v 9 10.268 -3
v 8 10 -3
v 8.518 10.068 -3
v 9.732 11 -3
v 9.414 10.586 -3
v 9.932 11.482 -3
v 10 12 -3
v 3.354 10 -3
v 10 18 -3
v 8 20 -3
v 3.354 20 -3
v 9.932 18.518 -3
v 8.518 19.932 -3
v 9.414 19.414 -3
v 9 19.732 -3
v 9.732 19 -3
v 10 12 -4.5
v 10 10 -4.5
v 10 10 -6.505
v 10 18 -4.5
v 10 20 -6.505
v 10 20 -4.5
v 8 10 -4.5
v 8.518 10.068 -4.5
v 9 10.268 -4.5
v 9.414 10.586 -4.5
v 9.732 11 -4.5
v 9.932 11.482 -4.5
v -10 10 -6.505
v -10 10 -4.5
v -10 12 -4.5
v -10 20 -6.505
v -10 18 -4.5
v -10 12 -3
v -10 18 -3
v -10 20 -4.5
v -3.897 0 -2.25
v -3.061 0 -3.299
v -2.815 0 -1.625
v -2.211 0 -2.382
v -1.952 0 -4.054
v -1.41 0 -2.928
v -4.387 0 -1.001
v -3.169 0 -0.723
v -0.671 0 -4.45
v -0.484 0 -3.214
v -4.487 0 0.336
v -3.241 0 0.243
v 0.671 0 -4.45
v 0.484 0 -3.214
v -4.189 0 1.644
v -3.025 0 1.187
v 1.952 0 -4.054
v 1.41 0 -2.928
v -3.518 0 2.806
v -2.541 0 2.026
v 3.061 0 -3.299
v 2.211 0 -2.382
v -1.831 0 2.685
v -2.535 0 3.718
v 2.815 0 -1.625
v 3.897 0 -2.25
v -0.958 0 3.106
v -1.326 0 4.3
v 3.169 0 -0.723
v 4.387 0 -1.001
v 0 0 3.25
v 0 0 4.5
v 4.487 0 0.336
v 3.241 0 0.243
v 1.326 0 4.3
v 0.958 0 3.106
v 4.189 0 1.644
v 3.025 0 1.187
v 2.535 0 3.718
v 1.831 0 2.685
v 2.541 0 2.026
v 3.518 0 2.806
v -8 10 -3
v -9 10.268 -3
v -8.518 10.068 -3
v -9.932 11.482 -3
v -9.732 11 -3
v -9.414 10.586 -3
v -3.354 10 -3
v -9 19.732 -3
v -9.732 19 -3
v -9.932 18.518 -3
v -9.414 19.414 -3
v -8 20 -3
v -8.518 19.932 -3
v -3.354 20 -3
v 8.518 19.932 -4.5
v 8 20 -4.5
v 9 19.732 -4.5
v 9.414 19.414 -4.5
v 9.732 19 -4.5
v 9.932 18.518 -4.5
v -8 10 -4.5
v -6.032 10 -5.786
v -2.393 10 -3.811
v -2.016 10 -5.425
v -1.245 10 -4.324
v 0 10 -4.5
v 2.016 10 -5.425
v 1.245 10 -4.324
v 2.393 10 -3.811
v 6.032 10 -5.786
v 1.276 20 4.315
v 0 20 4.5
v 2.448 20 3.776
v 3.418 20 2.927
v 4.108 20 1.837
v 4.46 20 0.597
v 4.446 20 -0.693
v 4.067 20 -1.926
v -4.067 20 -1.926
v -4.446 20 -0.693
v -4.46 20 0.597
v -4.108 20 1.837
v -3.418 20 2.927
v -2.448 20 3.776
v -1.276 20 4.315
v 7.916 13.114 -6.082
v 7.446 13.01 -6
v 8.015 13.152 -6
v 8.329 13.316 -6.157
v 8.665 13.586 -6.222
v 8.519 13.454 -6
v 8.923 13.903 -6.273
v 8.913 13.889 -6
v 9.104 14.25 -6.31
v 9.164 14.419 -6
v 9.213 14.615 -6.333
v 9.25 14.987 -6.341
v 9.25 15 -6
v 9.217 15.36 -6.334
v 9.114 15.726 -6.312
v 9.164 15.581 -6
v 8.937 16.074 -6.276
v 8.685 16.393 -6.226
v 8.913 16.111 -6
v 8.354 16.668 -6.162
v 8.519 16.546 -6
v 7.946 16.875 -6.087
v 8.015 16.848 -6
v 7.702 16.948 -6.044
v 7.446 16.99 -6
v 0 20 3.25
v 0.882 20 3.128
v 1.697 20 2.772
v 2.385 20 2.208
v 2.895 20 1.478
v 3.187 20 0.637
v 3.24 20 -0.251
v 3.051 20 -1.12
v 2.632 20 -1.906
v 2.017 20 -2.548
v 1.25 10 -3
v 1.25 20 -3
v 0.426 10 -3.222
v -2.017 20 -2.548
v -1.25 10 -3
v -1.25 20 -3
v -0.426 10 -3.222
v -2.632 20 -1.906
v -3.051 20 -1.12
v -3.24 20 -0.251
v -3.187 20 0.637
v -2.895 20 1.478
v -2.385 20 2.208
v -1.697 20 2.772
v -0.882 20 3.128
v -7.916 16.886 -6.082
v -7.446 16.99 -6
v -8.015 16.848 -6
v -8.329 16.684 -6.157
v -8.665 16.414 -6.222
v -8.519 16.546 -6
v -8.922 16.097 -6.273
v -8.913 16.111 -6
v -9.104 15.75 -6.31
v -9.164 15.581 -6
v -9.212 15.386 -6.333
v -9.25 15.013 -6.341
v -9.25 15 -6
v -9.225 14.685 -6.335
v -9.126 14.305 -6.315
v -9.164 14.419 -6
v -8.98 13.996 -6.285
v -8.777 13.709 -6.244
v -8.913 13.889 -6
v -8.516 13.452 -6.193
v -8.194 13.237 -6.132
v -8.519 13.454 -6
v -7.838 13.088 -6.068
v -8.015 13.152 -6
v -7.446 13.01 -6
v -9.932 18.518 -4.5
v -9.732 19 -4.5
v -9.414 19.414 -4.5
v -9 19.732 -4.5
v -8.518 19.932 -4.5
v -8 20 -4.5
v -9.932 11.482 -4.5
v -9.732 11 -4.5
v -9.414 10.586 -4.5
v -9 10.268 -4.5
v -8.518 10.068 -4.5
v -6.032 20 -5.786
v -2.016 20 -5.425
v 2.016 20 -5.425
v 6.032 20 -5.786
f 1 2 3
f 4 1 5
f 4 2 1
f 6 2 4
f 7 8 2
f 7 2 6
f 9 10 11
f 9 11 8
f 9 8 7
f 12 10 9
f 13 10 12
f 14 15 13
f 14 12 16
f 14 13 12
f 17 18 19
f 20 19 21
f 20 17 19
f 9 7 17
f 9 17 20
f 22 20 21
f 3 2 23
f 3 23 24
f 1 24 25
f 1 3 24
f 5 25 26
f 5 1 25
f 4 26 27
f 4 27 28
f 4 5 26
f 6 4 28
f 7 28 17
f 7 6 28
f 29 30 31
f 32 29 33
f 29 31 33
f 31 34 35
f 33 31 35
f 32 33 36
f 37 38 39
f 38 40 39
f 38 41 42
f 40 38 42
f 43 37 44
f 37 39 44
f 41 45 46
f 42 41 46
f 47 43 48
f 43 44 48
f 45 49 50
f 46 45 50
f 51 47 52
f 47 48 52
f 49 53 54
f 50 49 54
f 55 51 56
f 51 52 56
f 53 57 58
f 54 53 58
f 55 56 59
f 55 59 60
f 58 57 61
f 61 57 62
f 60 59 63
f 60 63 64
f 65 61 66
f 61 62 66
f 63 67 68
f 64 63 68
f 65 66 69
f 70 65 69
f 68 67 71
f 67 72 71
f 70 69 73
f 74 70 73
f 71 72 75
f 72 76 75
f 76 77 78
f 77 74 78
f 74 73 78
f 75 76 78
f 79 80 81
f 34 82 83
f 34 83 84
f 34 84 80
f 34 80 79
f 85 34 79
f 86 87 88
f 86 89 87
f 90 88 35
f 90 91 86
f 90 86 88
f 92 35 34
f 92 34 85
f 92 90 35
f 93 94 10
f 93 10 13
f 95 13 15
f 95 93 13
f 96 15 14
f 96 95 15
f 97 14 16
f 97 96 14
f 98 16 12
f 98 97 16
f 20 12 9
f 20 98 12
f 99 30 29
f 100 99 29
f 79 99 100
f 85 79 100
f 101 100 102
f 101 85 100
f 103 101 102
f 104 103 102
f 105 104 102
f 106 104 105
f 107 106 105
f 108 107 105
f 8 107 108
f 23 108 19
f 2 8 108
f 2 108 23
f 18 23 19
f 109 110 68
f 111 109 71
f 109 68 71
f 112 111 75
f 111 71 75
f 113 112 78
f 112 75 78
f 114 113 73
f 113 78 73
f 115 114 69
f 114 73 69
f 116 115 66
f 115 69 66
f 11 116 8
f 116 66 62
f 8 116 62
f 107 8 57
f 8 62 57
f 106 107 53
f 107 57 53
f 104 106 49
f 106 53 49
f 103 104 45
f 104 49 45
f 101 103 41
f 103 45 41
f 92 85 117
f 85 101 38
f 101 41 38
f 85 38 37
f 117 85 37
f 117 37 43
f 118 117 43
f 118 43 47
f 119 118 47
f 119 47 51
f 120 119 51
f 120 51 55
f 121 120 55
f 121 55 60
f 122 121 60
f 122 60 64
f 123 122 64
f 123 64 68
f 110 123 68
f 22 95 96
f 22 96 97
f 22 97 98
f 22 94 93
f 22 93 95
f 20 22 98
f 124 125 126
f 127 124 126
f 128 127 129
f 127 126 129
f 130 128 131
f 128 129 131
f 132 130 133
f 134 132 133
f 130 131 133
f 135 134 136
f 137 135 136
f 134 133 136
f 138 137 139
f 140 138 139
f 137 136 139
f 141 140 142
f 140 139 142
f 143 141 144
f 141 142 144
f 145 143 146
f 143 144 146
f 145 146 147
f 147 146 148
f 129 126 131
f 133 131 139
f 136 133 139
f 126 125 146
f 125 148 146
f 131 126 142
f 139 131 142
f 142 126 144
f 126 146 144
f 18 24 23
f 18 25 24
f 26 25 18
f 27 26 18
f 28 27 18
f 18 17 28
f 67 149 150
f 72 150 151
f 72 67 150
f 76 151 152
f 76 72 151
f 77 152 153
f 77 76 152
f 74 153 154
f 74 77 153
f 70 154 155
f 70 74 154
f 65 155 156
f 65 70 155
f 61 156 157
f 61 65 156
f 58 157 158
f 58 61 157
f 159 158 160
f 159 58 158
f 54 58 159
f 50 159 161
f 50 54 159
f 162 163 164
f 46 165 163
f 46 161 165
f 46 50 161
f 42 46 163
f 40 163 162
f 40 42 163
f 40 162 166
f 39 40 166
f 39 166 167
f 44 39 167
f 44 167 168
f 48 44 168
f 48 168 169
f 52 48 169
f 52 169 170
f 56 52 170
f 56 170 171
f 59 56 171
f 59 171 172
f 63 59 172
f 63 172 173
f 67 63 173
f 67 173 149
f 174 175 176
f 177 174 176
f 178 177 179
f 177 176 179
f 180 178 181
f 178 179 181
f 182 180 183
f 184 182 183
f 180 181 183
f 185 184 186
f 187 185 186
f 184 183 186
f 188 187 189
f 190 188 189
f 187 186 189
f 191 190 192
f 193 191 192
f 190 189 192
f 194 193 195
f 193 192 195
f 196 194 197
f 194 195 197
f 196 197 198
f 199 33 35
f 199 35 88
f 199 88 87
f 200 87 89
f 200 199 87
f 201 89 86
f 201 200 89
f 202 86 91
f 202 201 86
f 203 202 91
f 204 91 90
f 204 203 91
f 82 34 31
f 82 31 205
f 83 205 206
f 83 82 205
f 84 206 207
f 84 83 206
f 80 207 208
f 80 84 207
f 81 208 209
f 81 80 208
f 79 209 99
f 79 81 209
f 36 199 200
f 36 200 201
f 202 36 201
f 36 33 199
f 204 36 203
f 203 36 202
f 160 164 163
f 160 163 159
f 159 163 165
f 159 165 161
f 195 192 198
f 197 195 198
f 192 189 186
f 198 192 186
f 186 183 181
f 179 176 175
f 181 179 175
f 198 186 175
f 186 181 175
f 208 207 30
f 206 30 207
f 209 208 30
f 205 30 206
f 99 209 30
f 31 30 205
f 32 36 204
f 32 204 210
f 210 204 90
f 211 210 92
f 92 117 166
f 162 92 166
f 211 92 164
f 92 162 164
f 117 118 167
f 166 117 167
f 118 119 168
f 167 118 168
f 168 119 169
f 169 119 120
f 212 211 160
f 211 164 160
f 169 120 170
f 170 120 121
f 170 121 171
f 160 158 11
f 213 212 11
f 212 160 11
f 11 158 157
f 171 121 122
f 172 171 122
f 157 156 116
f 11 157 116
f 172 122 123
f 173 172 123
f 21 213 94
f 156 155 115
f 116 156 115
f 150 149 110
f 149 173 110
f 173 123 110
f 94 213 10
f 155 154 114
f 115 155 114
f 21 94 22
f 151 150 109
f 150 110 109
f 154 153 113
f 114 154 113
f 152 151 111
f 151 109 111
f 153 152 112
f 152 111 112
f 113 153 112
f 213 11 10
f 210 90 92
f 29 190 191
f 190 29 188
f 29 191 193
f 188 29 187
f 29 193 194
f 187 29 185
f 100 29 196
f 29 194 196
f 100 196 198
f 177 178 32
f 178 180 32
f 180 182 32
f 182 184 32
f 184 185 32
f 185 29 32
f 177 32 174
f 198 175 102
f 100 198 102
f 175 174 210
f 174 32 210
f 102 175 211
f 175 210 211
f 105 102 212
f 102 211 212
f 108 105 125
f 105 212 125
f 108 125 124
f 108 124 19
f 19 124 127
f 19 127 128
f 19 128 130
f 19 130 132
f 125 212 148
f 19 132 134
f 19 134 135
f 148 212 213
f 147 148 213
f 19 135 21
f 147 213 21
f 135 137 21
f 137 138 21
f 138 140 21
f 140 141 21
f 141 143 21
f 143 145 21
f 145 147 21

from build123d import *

# Parameters (mm, degrees)
SKETCH1_R           = 4.5
SKETCH1_R_2         = 3.25
BOSS_EXTRUDE1_DEPTH = 20
SKETCH2_W           = 20
SKETCH2_H           = 10
BOSS_EXTRUDE2_DEPTH = 1.5
FILLET1_R           = 2
SKETCH2_4_W         = 20
SKETCH2_4_H         = 10
SKETCH2_4_R         = 2
BOSS_EXTRUDE3_DEPTH = 3
SKETCH4_R           = 45
CUT_EXTRUDE1_DEPTH  = 10


with BuildPart() as part:
    # Sketch1 → Boss-Extrude1 (new body)
    with BuildSketch(Plane(origin=(0, 0, 0), x_dir=(1, 0, 0), z_dir=(0, 1, 0))):
        Circle(SKETCH1_R)
        Circle(SKETCH1_R_2, mode=Mode.SUBTRACT)
    extrude(amount=BOSS_EXTRUDE1_DEPTH)

    # Sketch2 → Boss-Extrude2 (add, symmetric)
    with BuildSketch(Plane.XY.offset(-4.5)):
        with Locations((0, 15)):
            Rectangle(SKETCH2_W, SKETCH2_H)
    extrude(amount=BOSS_EXTRUDE2_DEPTH, both=True)

    # Fillet1
    fillet1_edges = [part.edges().sort_by_distance(p)[0] for p in [
        (-10, 10, -4.5),
        (-10, 20, -4.5),
        (10, 10, -4.5),
        (10, 20, -4.5),
    ]]
    fillet(fillet1_edges, radius=FILLET1_R)

    # Sketch2<4> → Boss-Extrude3 (add)
    with BuildSketch(Plane.XY.offset(-4.5)):
        with Locations((0, 15)):
            Rectangle(SKETCH2_4_W, SKETCH2_4_H)
        with Locations((-7.25, 15)):
            Circle(SKETCH2_4_R, mode=Mode.SUBTRACT)
        with Locations((7.25, 15)):
            Circle(SKETCH2_4_R, mode=Mode.SUBTRACT)
    extrude(amount=-BOSS_EXTRUDE3_DEPTH)

    # Sketch4 → Cut-Extrude1 (cut)
    with BuildSketch(Plane(origin=(0, 20, 0), x_dir=(1, 0, 0), z_dir=(0, 1, 0))):
        with Locations((0, 50.37974859)):
            Circle(SKETCH4_R)
    extrude(amount=-CUT_EXTRUDE1_DEPTH, mode=Mode.SUBTRACT)


solid = part.part
